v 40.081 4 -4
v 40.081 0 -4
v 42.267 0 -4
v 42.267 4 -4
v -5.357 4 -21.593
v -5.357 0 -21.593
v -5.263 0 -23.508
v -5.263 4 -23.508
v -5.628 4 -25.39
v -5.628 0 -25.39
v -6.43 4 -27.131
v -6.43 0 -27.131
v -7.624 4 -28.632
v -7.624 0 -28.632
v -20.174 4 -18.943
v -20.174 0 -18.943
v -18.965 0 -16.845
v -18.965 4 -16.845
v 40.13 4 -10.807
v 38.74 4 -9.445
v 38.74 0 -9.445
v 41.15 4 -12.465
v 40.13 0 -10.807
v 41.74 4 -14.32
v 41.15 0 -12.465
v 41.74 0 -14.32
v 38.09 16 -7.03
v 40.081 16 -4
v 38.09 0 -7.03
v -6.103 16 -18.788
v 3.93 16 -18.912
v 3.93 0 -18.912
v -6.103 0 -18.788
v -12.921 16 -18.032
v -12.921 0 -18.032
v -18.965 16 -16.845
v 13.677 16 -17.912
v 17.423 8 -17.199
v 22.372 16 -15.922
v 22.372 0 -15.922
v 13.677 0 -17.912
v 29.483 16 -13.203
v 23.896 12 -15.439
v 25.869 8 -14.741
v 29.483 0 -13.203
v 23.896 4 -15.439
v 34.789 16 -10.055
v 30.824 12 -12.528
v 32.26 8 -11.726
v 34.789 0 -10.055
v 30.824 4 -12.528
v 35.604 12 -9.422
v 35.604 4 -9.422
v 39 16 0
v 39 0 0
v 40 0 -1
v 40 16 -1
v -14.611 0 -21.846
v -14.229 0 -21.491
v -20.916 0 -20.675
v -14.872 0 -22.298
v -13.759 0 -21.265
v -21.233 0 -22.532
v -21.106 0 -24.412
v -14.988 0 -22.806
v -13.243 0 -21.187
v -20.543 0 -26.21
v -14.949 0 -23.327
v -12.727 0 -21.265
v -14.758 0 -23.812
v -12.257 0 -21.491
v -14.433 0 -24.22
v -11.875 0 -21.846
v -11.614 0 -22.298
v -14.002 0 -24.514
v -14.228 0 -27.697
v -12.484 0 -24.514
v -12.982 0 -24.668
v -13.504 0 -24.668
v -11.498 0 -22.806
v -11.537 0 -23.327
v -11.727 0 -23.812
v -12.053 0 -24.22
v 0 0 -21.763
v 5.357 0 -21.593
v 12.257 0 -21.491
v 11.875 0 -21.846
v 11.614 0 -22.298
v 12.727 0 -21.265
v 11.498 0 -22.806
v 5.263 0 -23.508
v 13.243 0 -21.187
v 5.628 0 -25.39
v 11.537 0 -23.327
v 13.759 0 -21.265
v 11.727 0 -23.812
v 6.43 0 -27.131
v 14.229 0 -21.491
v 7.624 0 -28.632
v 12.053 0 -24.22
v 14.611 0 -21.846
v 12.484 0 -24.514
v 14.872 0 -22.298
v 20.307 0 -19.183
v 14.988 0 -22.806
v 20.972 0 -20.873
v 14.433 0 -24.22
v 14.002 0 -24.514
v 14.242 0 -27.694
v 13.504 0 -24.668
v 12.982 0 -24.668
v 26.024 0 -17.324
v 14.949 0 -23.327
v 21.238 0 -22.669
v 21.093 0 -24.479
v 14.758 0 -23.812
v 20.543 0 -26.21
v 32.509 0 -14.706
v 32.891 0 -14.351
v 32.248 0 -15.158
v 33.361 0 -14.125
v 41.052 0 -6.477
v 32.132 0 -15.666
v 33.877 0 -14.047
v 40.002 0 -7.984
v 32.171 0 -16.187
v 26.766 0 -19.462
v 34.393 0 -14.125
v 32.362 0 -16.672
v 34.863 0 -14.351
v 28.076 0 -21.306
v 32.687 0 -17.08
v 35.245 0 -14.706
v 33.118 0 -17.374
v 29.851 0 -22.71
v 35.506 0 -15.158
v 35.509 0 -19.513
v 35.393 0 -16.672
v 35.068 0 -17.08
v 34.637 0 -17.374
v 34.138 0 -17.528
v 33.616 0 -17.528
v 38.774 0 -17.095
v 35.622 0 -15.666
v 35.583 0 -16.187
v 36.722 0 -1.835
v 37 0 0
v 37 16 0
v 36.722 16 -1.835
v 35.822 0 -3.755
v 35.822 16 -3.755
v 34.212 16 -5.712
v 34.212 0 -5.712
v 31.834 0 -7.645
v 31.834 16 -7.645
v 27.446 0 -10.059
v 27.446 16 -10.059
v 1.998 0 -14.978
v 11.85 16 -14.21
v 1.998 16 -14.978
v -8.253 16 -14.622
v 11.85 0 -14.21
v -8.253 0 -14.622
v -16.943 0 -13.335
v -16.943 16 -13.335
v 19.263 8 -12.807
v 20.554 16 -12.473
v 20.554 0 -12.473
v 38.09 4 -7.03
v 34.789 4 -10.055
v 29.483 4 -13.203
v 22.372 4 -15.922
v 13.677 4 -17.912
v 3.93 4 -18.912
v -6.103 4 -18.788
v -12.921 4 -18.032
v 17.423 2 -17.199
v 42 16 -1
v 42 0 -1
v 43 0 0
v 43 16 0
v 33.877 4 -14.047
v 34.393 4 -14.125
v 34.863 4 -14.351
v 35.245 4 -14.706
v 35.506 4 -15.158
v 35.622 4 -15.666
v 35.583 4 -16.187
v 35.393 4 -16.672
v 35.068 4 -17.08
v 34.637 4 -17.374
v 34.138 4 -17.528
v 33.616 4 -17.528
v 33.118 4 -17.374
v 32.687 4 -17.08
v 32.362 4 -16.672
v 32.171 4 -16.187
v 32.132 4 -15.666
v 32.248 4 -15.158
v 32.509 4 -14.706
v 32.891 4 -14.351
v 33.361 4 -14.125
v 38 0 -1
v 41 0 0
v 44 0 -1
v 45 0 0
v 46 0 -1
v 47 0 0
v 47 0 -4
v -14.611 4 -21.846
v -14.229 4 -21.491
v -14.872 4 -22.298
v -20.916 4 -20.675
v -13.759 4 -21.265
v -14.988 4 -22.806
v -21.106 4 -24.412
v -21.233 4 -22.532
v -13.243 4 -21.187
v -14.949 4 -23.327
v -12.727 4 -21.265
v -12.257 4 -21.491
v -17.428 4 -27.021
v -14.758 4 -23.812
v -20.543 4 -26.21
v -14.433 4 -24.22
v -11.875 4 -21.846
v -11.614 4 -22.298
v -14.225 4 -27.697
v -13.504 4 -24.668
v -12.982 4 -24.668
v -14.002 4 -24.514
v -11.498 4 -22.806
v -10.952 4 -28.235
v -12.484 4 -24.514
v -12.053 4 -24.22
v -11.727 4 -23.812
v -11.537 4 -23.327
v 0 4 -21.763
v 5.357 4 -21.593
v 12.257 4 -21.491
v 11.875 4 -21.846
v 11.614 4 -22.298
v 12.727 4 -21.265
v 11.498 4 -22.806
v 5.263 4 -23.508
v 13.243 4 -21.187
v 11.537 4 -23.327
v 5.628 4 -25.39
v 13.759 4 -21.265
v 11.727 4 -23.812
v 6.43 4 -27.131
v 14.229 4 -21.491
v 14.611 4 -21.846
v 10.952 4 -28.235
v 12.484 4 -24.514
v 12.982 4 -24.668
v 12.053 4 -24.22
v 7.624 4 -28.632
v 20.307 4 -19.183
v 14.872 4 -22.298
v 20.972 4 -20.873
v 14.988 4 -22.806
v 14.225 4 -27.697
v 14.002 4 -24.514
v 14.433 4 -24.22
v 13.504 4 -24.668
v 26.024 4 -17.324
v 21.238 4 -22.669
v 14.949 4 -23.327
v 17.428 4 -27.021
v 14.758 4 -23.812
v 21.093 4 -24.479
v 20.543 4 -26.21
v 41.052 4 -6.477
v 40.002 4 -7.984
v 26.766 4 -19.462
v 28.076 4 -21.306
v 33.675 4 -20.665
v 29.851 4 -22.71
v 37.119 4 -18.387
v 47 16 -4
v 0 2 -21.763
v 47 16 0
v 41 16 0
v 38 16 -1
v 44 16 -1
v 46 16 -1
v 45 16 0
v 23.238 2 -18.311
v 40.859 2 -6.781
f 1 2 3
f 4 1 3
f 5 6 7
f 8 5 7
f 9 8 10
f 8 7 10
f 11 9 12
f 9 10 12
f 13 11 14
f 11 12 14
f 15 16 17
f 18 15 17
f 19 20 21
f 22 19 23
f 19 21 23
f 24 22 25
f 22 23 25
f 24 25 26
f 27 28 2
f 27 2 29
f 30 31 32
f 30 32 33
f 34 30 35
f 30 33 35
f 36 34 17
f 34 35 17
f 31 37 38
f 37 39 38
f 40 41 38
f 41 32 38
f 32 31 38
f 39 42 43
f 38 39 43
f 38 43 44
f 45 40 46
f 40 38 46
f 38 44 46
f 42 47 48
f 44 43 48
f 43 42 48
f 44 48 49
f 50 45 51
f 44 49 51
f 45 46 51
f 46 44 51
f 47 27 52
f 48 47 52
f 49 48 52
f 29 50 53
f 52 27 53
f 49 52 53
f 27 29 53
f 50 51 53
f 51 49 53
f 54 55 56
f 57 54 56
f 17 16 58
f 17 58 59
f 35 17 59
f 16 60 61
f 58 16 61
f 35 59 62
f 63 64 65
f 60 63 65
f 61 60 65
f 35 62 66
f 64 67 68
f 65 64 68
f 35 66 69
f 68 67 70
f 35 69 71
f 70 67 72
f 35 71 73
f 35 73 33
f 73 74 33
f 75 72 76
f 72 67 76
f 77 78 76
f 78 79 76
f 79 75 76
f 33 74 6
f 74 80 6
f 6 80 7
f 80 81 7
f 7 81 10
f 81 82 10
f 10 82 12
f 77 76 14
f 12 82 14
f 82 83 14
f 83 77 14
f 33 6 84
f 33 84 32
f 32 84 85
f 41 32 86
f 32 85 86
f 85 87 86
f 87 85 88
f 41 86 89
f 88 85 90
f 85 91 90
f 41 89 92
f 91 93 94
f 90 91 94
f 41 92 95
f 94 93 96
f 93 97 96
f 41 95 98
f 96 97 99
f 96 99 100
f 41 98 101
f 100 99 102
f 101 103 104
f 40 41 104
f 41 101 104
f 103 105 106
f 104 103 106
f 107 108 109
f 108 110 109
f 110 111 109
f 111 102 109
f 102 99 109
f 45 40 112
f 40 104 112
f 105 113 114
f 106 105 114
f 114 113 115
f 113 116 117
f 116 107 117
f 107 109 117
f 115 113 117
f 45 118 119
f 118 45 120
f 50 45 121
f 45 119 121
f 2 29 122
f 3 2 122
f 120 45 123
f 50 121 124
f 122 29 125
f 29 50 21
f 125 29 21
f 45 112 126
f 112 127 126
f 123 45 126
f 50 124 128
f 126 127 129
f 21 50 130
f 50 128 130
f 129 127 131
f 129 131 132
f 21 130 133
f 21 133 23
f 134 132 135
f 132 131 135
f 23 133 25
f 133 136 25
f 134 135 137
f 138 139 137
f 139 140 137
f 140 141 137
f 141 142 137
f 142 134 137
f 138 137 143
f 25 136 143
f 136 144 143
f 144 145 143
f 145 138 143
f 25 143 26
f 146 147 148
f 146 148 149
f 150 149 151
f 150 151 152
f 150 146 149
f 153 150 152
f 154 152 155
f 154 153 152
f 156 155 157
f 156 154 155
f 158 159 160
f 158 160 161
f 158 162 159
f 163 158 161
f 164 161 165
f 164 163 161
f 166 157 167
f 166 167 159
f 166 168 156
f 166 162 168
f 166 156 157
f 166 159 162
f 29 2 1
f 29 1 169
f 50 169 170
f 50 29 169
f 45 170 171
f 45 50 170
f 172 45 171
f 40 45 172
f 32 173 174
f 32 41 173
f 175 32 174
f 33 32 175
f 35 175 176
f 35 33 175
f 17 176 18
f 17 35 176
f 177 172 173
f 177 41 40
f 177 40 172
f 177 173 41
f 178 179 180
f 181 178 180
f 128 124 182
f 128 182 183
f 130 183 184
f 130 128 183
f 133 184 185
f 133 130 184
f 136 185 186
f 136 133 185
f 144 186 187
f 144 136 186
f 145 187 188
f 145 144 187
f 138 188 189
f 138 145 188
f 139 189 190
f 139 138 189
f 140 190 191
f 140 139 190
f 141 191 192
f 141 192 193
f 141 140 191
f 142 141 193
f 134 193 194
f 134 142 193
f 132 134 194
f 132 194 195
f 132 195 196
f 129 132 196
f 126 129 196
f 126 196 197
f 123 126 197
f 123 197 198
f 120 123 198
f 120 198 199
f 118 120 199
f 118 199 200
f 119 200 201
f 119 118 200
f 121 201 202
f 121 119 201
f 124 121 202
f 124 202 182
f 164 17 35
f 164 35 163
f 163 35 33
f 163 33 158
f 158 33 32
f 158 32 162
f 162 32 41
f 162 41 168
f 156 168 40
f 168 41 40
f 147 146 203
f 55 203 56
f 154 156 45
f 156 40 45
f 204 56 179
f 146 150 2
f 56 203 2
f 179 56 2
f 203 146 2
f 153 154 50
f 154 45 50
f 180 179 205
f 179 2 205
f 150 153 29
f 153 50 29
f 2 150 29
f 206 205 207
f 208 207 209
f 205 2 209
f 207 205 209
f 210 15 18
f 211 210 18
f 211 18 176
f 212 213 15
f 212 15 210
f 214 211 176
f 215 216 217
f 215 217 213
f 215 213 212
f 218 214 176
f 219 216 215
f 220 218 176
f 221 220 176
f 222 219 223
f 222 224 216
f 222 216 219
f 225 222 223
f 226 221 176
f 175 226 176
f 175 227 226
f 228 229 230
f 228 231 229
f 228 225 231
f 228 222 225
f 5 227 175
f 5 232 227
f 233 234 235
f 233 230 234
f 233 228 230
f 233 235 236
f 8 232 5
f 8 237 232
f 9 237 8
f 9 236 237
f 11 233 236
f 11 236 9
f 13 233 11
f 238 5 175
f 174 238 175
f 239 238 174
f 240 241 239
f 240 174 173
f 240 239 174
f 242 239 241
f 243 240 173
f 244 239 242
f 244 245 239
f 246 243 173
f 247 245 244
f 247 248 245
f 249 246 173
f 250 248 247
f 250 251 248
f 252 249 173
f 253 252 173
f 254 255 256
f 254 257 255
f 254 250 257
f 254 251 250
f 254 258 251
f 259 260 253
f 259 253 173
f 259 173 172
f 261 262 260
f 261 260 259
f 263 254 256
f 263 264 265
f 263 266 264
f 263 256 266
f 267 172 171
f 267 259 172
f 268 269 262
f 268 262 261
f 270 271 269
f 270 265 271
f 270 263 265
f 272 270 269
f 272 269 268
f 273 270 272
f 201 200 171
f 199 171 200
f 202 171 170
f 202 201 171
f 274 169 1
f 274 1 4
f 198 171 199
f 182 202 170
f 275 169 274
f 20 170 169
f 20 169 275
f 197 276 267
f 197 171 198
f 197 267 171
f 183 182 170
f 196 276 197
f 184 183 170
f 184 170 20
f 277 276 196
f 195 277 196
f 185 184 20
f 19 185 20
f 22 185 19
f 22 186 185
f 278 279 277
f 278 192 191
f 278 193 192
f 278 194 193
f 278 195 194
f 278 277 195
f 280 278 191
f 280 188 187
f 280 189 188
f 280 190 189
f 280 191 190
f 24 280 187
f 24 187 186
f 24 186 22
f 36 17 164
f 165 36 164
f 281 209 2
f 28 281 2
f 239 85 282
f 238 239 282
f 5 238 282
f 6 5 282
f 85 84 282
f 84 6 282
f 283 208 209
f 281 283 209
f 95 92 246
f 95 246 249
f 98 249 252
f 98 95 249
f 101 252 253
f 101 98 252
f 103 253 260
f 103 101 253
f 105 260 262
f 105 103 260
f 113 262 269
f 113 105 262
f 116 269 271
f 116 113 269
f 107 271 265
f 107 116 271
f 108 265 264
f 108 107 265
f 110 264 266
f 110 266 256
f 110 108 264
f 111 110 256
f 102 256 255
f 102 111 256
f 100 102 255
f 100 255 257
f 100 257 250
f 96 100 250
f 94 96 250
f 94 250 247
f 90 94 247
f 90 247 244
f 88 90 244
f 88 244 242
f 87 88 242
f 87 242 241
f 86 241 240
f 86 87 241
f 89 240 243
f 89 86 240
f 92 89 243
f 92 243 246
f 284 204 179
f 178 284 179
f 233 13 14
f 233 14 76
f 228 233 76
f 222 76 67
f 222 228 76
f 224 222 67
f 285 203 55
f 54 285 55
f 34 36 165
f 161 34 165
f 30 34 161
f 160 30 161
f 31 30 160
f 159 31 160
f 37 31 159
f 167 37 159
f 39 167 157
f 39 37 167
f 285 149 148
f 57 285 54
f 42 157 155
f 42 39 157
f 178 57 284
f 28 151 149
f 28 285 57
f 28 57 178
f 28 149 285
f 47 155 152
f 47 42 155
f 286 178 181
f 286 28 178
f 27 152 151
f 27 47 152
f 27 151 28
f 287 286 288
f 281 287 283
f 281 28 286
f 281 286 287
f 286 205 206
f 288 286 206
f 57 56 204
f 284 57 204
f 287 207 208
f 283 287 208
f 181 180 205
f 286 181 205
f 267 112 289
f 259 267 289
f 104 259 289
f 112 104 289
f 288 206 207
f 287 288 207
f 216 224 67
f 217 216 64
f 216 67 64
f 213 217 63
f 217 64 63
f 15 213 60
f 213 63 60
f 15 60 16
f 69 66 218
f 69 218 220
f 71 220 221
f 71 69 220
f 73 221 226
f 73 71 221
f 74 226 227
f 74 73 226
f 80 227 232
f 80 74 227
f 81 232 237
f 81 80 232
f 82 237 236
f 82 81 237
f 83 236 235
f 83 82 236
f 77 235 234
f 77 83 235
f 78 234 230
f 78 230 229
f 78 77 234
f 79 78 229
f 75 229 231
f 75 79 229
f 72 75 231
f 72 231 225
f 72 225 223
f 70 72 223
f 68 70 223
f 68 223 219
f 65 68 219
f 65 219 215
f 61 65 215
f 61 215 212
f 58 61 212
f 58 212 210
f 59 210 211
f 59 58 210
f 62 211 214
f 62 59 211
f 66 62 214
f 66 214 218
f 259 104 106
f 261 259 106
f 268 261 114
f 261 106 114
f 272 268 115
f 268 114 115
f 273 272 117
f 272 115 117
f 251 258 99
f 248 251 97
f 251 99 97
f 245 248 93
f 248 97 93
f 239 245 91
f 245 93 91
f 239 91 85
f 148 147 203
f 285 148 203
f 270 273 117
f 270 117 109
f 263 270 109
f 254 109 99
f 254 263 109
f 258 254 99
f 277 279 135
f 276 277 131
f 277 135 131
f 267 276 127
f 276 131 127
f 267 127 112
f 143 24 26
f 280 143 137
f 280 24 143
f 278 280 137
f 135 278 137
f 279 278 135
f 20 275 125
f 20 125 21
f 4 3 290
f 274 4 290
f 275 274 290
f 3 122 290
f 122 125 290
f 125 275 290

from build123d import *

# Parameters (mm, degrees)
SKETCH_1_R           = 1.75
EXTRUDE_1_DEPTH      = 4
EXTRUDE_2_DEPTH      = 12
EXTRUDE_2_DEPTH_BACK = 4
SKETCH_3_RX          = 67.635215972
SKETCH_3_RY          = 42.561403697
SKETCH_3_RX_2        = 48
SKETCH_3_RY_2        = 29
CUT_EXTRUDE_1_DEPTH  = 58.533572984


with BuildPart() as part:
    # Эскиз1 → Бобышка-Вытянуть1 (new body)
    with BuildSketch(Plane(origin=(0, 0, 0), x_dir=(1, 0, 0), z_dir=(0, 1, 0))):
        with BuildLine():
            Line((-20.174303771, 18.942924546), (-18.965402515, 16.84506463))
            add(Edge.make_bspline(
                [(40.081115814, 4), (28.750564553, 28.382056896), (-18.965402515, 16.84506463)],
                knots=[3.353705964, 3.353705964, 3.353705964, 5.193281659, 5.193281659, 5.193281659], degree=2, weights=[1, 0.605988932, 1]))
            Line((40.081115814, 4), (42.267431178, 4))
            add(Edge.make_bspline(
                [(42.267431178, 4), (41.217865879, 6.840819881), (38.739700818, 9.444538848)],
                knots=[0.184851718, 0.184851718, 0.184851718, 0.44890402, 0.44890402, 0.44890402], degree=2, weights=[1, 0.9912972, 1]))
            ThreePointArc((38.739700818, 9.444538848), (38.091362137, 22.597313653), (26.024371113, 17.32440594))
            add(Edge.make_bspline(
                [(26.024371113, 17.32440594), (23.311300844, 18.368335767), (20.30717858, 19.182928724)],
                knots=[0.920756723, 0.920756723, 0.920756723, 1.078943412, 1.078943412, 1.078943412], degree=2, weights=[1, 0.996873752, 1]))
            ThreePointArc((20.30717858, 19.182928724), (14.516083792, 30.835250875), (5.356526294, 21.593178771))
            add(Edge.make_bspline(
                [(5.356526294, 21.593178771), (0, 21.933538582), (-5.356526294, 21.593178771)],
                knots=[1.445901501, 1.445901501, 1.445901501, 1.695691152, 1.695691152, 1.695691152], degree=2, weights=[1, 0.992210774, 1]))
            ThreePointArc((-5.356526294, 21.593178771), (-14.651313877, 30.81225876), (-20.174303771, 18.942924546))
        make_face()
        with Locations(Location((33.877249978, 15.797221102, 0), (0, 0, 270))):
            Circle(SKETCH_1_R, mode=Mode.SUBTRACT)
        with Locations(Location((13.24281407, 22.937226804, 0), (0, 0, 270))):
            Circle(SKETCH_1_R, mode=Mode.SUBTRACT)
        with Locations(Location((-13.24281407, 22.937226804, 0), (0, 0, 270))):
            Circle(SKETCH_1_R, mode=Mode.SUBTRACT)
    extrude(amount=EXTRUDE_1_DEPTH)

    # Эскиз3 → Вырез-Вытянуть1 (cut, through all)
    with BuildSketch(Plane(origin=(0, 4, 0), x_dir=(1, 0, 0), z_dir=(0, 1, 0))):
        with Locations(Location((0, 0), (0, 0, 180))):
            Ellipse(SKETCH_3_RX, SKETCH_3_RY)
        with Locations(Location((0, 0), (0, 0, 180))):
            Ellipse(SKETCH_3_RX_2, SKETCH_3_RY_2, mode=Mode.SUBTRACT)
    extrude(amount=-CUT_EXTRUDE_1_DEPTH, mode=Mode.SUBTRACT)


with BuildPart() as body_2:
    # Эскиз2 → Бобышка-Вытянуть2 (new, two sides: drawn at the far end of the back side and taken through both)
    with BuildSketch(Plane(origin=(0, 4, 0), x_dir=(1, 0, 0), z_dir=(0, 1, 0)).offset(-EXTRUDE_2_DEPTH_BACK)):
        with BuildLine():
            Line((47, 0), (47, 4))
            Line((47, 4), (40.081115814, 4))
            add(Edge.make_bspline(
                [(40.081115814, 4), (28.750564553, 28.382056896), (-18.965402515, 16.84506463)],
                knots=[3.353705964, 3.353705964, 3.353705964, 5.193281659, 5.193281659, 5.193281659], degree=2, weights=[1, 0.605988932, 1]))
            Line((-18.965402515, 16.84506463), (-16.942696267, 13.334972849))
            add(Edge.make_bspline(
                [(37, 0), (37, 24.599218419), (-16.942696267, 13.334972849)],
                knots=[3.141592654, 3.141592654, 3.141592654, 5.18803259, 5.18803259, 5.18803259], degree=2, weights=[1, 0.520619482, 1]))
            Line((37, 0), (38, 1))
            Line((38, 1), (39, 0))
            Line((39, 0), (40, 1))
            Line((40, 1), (41, 0))
            Line((41, 0), (42, 1))
            Line((42, 1), (43, 0))
            Line((43, 0), (44, 1))
            Line((44, 1), (45, 0))
            Line((45, 0), (46, 1))
            Line((46, 1), (47, 0))
        make_face()
    extrude(amount=EXTRUDE_2_DEPTH + EXTRUDE_2_DEPTH_BACK)


solid = Compound([part.part, body_2.part])
